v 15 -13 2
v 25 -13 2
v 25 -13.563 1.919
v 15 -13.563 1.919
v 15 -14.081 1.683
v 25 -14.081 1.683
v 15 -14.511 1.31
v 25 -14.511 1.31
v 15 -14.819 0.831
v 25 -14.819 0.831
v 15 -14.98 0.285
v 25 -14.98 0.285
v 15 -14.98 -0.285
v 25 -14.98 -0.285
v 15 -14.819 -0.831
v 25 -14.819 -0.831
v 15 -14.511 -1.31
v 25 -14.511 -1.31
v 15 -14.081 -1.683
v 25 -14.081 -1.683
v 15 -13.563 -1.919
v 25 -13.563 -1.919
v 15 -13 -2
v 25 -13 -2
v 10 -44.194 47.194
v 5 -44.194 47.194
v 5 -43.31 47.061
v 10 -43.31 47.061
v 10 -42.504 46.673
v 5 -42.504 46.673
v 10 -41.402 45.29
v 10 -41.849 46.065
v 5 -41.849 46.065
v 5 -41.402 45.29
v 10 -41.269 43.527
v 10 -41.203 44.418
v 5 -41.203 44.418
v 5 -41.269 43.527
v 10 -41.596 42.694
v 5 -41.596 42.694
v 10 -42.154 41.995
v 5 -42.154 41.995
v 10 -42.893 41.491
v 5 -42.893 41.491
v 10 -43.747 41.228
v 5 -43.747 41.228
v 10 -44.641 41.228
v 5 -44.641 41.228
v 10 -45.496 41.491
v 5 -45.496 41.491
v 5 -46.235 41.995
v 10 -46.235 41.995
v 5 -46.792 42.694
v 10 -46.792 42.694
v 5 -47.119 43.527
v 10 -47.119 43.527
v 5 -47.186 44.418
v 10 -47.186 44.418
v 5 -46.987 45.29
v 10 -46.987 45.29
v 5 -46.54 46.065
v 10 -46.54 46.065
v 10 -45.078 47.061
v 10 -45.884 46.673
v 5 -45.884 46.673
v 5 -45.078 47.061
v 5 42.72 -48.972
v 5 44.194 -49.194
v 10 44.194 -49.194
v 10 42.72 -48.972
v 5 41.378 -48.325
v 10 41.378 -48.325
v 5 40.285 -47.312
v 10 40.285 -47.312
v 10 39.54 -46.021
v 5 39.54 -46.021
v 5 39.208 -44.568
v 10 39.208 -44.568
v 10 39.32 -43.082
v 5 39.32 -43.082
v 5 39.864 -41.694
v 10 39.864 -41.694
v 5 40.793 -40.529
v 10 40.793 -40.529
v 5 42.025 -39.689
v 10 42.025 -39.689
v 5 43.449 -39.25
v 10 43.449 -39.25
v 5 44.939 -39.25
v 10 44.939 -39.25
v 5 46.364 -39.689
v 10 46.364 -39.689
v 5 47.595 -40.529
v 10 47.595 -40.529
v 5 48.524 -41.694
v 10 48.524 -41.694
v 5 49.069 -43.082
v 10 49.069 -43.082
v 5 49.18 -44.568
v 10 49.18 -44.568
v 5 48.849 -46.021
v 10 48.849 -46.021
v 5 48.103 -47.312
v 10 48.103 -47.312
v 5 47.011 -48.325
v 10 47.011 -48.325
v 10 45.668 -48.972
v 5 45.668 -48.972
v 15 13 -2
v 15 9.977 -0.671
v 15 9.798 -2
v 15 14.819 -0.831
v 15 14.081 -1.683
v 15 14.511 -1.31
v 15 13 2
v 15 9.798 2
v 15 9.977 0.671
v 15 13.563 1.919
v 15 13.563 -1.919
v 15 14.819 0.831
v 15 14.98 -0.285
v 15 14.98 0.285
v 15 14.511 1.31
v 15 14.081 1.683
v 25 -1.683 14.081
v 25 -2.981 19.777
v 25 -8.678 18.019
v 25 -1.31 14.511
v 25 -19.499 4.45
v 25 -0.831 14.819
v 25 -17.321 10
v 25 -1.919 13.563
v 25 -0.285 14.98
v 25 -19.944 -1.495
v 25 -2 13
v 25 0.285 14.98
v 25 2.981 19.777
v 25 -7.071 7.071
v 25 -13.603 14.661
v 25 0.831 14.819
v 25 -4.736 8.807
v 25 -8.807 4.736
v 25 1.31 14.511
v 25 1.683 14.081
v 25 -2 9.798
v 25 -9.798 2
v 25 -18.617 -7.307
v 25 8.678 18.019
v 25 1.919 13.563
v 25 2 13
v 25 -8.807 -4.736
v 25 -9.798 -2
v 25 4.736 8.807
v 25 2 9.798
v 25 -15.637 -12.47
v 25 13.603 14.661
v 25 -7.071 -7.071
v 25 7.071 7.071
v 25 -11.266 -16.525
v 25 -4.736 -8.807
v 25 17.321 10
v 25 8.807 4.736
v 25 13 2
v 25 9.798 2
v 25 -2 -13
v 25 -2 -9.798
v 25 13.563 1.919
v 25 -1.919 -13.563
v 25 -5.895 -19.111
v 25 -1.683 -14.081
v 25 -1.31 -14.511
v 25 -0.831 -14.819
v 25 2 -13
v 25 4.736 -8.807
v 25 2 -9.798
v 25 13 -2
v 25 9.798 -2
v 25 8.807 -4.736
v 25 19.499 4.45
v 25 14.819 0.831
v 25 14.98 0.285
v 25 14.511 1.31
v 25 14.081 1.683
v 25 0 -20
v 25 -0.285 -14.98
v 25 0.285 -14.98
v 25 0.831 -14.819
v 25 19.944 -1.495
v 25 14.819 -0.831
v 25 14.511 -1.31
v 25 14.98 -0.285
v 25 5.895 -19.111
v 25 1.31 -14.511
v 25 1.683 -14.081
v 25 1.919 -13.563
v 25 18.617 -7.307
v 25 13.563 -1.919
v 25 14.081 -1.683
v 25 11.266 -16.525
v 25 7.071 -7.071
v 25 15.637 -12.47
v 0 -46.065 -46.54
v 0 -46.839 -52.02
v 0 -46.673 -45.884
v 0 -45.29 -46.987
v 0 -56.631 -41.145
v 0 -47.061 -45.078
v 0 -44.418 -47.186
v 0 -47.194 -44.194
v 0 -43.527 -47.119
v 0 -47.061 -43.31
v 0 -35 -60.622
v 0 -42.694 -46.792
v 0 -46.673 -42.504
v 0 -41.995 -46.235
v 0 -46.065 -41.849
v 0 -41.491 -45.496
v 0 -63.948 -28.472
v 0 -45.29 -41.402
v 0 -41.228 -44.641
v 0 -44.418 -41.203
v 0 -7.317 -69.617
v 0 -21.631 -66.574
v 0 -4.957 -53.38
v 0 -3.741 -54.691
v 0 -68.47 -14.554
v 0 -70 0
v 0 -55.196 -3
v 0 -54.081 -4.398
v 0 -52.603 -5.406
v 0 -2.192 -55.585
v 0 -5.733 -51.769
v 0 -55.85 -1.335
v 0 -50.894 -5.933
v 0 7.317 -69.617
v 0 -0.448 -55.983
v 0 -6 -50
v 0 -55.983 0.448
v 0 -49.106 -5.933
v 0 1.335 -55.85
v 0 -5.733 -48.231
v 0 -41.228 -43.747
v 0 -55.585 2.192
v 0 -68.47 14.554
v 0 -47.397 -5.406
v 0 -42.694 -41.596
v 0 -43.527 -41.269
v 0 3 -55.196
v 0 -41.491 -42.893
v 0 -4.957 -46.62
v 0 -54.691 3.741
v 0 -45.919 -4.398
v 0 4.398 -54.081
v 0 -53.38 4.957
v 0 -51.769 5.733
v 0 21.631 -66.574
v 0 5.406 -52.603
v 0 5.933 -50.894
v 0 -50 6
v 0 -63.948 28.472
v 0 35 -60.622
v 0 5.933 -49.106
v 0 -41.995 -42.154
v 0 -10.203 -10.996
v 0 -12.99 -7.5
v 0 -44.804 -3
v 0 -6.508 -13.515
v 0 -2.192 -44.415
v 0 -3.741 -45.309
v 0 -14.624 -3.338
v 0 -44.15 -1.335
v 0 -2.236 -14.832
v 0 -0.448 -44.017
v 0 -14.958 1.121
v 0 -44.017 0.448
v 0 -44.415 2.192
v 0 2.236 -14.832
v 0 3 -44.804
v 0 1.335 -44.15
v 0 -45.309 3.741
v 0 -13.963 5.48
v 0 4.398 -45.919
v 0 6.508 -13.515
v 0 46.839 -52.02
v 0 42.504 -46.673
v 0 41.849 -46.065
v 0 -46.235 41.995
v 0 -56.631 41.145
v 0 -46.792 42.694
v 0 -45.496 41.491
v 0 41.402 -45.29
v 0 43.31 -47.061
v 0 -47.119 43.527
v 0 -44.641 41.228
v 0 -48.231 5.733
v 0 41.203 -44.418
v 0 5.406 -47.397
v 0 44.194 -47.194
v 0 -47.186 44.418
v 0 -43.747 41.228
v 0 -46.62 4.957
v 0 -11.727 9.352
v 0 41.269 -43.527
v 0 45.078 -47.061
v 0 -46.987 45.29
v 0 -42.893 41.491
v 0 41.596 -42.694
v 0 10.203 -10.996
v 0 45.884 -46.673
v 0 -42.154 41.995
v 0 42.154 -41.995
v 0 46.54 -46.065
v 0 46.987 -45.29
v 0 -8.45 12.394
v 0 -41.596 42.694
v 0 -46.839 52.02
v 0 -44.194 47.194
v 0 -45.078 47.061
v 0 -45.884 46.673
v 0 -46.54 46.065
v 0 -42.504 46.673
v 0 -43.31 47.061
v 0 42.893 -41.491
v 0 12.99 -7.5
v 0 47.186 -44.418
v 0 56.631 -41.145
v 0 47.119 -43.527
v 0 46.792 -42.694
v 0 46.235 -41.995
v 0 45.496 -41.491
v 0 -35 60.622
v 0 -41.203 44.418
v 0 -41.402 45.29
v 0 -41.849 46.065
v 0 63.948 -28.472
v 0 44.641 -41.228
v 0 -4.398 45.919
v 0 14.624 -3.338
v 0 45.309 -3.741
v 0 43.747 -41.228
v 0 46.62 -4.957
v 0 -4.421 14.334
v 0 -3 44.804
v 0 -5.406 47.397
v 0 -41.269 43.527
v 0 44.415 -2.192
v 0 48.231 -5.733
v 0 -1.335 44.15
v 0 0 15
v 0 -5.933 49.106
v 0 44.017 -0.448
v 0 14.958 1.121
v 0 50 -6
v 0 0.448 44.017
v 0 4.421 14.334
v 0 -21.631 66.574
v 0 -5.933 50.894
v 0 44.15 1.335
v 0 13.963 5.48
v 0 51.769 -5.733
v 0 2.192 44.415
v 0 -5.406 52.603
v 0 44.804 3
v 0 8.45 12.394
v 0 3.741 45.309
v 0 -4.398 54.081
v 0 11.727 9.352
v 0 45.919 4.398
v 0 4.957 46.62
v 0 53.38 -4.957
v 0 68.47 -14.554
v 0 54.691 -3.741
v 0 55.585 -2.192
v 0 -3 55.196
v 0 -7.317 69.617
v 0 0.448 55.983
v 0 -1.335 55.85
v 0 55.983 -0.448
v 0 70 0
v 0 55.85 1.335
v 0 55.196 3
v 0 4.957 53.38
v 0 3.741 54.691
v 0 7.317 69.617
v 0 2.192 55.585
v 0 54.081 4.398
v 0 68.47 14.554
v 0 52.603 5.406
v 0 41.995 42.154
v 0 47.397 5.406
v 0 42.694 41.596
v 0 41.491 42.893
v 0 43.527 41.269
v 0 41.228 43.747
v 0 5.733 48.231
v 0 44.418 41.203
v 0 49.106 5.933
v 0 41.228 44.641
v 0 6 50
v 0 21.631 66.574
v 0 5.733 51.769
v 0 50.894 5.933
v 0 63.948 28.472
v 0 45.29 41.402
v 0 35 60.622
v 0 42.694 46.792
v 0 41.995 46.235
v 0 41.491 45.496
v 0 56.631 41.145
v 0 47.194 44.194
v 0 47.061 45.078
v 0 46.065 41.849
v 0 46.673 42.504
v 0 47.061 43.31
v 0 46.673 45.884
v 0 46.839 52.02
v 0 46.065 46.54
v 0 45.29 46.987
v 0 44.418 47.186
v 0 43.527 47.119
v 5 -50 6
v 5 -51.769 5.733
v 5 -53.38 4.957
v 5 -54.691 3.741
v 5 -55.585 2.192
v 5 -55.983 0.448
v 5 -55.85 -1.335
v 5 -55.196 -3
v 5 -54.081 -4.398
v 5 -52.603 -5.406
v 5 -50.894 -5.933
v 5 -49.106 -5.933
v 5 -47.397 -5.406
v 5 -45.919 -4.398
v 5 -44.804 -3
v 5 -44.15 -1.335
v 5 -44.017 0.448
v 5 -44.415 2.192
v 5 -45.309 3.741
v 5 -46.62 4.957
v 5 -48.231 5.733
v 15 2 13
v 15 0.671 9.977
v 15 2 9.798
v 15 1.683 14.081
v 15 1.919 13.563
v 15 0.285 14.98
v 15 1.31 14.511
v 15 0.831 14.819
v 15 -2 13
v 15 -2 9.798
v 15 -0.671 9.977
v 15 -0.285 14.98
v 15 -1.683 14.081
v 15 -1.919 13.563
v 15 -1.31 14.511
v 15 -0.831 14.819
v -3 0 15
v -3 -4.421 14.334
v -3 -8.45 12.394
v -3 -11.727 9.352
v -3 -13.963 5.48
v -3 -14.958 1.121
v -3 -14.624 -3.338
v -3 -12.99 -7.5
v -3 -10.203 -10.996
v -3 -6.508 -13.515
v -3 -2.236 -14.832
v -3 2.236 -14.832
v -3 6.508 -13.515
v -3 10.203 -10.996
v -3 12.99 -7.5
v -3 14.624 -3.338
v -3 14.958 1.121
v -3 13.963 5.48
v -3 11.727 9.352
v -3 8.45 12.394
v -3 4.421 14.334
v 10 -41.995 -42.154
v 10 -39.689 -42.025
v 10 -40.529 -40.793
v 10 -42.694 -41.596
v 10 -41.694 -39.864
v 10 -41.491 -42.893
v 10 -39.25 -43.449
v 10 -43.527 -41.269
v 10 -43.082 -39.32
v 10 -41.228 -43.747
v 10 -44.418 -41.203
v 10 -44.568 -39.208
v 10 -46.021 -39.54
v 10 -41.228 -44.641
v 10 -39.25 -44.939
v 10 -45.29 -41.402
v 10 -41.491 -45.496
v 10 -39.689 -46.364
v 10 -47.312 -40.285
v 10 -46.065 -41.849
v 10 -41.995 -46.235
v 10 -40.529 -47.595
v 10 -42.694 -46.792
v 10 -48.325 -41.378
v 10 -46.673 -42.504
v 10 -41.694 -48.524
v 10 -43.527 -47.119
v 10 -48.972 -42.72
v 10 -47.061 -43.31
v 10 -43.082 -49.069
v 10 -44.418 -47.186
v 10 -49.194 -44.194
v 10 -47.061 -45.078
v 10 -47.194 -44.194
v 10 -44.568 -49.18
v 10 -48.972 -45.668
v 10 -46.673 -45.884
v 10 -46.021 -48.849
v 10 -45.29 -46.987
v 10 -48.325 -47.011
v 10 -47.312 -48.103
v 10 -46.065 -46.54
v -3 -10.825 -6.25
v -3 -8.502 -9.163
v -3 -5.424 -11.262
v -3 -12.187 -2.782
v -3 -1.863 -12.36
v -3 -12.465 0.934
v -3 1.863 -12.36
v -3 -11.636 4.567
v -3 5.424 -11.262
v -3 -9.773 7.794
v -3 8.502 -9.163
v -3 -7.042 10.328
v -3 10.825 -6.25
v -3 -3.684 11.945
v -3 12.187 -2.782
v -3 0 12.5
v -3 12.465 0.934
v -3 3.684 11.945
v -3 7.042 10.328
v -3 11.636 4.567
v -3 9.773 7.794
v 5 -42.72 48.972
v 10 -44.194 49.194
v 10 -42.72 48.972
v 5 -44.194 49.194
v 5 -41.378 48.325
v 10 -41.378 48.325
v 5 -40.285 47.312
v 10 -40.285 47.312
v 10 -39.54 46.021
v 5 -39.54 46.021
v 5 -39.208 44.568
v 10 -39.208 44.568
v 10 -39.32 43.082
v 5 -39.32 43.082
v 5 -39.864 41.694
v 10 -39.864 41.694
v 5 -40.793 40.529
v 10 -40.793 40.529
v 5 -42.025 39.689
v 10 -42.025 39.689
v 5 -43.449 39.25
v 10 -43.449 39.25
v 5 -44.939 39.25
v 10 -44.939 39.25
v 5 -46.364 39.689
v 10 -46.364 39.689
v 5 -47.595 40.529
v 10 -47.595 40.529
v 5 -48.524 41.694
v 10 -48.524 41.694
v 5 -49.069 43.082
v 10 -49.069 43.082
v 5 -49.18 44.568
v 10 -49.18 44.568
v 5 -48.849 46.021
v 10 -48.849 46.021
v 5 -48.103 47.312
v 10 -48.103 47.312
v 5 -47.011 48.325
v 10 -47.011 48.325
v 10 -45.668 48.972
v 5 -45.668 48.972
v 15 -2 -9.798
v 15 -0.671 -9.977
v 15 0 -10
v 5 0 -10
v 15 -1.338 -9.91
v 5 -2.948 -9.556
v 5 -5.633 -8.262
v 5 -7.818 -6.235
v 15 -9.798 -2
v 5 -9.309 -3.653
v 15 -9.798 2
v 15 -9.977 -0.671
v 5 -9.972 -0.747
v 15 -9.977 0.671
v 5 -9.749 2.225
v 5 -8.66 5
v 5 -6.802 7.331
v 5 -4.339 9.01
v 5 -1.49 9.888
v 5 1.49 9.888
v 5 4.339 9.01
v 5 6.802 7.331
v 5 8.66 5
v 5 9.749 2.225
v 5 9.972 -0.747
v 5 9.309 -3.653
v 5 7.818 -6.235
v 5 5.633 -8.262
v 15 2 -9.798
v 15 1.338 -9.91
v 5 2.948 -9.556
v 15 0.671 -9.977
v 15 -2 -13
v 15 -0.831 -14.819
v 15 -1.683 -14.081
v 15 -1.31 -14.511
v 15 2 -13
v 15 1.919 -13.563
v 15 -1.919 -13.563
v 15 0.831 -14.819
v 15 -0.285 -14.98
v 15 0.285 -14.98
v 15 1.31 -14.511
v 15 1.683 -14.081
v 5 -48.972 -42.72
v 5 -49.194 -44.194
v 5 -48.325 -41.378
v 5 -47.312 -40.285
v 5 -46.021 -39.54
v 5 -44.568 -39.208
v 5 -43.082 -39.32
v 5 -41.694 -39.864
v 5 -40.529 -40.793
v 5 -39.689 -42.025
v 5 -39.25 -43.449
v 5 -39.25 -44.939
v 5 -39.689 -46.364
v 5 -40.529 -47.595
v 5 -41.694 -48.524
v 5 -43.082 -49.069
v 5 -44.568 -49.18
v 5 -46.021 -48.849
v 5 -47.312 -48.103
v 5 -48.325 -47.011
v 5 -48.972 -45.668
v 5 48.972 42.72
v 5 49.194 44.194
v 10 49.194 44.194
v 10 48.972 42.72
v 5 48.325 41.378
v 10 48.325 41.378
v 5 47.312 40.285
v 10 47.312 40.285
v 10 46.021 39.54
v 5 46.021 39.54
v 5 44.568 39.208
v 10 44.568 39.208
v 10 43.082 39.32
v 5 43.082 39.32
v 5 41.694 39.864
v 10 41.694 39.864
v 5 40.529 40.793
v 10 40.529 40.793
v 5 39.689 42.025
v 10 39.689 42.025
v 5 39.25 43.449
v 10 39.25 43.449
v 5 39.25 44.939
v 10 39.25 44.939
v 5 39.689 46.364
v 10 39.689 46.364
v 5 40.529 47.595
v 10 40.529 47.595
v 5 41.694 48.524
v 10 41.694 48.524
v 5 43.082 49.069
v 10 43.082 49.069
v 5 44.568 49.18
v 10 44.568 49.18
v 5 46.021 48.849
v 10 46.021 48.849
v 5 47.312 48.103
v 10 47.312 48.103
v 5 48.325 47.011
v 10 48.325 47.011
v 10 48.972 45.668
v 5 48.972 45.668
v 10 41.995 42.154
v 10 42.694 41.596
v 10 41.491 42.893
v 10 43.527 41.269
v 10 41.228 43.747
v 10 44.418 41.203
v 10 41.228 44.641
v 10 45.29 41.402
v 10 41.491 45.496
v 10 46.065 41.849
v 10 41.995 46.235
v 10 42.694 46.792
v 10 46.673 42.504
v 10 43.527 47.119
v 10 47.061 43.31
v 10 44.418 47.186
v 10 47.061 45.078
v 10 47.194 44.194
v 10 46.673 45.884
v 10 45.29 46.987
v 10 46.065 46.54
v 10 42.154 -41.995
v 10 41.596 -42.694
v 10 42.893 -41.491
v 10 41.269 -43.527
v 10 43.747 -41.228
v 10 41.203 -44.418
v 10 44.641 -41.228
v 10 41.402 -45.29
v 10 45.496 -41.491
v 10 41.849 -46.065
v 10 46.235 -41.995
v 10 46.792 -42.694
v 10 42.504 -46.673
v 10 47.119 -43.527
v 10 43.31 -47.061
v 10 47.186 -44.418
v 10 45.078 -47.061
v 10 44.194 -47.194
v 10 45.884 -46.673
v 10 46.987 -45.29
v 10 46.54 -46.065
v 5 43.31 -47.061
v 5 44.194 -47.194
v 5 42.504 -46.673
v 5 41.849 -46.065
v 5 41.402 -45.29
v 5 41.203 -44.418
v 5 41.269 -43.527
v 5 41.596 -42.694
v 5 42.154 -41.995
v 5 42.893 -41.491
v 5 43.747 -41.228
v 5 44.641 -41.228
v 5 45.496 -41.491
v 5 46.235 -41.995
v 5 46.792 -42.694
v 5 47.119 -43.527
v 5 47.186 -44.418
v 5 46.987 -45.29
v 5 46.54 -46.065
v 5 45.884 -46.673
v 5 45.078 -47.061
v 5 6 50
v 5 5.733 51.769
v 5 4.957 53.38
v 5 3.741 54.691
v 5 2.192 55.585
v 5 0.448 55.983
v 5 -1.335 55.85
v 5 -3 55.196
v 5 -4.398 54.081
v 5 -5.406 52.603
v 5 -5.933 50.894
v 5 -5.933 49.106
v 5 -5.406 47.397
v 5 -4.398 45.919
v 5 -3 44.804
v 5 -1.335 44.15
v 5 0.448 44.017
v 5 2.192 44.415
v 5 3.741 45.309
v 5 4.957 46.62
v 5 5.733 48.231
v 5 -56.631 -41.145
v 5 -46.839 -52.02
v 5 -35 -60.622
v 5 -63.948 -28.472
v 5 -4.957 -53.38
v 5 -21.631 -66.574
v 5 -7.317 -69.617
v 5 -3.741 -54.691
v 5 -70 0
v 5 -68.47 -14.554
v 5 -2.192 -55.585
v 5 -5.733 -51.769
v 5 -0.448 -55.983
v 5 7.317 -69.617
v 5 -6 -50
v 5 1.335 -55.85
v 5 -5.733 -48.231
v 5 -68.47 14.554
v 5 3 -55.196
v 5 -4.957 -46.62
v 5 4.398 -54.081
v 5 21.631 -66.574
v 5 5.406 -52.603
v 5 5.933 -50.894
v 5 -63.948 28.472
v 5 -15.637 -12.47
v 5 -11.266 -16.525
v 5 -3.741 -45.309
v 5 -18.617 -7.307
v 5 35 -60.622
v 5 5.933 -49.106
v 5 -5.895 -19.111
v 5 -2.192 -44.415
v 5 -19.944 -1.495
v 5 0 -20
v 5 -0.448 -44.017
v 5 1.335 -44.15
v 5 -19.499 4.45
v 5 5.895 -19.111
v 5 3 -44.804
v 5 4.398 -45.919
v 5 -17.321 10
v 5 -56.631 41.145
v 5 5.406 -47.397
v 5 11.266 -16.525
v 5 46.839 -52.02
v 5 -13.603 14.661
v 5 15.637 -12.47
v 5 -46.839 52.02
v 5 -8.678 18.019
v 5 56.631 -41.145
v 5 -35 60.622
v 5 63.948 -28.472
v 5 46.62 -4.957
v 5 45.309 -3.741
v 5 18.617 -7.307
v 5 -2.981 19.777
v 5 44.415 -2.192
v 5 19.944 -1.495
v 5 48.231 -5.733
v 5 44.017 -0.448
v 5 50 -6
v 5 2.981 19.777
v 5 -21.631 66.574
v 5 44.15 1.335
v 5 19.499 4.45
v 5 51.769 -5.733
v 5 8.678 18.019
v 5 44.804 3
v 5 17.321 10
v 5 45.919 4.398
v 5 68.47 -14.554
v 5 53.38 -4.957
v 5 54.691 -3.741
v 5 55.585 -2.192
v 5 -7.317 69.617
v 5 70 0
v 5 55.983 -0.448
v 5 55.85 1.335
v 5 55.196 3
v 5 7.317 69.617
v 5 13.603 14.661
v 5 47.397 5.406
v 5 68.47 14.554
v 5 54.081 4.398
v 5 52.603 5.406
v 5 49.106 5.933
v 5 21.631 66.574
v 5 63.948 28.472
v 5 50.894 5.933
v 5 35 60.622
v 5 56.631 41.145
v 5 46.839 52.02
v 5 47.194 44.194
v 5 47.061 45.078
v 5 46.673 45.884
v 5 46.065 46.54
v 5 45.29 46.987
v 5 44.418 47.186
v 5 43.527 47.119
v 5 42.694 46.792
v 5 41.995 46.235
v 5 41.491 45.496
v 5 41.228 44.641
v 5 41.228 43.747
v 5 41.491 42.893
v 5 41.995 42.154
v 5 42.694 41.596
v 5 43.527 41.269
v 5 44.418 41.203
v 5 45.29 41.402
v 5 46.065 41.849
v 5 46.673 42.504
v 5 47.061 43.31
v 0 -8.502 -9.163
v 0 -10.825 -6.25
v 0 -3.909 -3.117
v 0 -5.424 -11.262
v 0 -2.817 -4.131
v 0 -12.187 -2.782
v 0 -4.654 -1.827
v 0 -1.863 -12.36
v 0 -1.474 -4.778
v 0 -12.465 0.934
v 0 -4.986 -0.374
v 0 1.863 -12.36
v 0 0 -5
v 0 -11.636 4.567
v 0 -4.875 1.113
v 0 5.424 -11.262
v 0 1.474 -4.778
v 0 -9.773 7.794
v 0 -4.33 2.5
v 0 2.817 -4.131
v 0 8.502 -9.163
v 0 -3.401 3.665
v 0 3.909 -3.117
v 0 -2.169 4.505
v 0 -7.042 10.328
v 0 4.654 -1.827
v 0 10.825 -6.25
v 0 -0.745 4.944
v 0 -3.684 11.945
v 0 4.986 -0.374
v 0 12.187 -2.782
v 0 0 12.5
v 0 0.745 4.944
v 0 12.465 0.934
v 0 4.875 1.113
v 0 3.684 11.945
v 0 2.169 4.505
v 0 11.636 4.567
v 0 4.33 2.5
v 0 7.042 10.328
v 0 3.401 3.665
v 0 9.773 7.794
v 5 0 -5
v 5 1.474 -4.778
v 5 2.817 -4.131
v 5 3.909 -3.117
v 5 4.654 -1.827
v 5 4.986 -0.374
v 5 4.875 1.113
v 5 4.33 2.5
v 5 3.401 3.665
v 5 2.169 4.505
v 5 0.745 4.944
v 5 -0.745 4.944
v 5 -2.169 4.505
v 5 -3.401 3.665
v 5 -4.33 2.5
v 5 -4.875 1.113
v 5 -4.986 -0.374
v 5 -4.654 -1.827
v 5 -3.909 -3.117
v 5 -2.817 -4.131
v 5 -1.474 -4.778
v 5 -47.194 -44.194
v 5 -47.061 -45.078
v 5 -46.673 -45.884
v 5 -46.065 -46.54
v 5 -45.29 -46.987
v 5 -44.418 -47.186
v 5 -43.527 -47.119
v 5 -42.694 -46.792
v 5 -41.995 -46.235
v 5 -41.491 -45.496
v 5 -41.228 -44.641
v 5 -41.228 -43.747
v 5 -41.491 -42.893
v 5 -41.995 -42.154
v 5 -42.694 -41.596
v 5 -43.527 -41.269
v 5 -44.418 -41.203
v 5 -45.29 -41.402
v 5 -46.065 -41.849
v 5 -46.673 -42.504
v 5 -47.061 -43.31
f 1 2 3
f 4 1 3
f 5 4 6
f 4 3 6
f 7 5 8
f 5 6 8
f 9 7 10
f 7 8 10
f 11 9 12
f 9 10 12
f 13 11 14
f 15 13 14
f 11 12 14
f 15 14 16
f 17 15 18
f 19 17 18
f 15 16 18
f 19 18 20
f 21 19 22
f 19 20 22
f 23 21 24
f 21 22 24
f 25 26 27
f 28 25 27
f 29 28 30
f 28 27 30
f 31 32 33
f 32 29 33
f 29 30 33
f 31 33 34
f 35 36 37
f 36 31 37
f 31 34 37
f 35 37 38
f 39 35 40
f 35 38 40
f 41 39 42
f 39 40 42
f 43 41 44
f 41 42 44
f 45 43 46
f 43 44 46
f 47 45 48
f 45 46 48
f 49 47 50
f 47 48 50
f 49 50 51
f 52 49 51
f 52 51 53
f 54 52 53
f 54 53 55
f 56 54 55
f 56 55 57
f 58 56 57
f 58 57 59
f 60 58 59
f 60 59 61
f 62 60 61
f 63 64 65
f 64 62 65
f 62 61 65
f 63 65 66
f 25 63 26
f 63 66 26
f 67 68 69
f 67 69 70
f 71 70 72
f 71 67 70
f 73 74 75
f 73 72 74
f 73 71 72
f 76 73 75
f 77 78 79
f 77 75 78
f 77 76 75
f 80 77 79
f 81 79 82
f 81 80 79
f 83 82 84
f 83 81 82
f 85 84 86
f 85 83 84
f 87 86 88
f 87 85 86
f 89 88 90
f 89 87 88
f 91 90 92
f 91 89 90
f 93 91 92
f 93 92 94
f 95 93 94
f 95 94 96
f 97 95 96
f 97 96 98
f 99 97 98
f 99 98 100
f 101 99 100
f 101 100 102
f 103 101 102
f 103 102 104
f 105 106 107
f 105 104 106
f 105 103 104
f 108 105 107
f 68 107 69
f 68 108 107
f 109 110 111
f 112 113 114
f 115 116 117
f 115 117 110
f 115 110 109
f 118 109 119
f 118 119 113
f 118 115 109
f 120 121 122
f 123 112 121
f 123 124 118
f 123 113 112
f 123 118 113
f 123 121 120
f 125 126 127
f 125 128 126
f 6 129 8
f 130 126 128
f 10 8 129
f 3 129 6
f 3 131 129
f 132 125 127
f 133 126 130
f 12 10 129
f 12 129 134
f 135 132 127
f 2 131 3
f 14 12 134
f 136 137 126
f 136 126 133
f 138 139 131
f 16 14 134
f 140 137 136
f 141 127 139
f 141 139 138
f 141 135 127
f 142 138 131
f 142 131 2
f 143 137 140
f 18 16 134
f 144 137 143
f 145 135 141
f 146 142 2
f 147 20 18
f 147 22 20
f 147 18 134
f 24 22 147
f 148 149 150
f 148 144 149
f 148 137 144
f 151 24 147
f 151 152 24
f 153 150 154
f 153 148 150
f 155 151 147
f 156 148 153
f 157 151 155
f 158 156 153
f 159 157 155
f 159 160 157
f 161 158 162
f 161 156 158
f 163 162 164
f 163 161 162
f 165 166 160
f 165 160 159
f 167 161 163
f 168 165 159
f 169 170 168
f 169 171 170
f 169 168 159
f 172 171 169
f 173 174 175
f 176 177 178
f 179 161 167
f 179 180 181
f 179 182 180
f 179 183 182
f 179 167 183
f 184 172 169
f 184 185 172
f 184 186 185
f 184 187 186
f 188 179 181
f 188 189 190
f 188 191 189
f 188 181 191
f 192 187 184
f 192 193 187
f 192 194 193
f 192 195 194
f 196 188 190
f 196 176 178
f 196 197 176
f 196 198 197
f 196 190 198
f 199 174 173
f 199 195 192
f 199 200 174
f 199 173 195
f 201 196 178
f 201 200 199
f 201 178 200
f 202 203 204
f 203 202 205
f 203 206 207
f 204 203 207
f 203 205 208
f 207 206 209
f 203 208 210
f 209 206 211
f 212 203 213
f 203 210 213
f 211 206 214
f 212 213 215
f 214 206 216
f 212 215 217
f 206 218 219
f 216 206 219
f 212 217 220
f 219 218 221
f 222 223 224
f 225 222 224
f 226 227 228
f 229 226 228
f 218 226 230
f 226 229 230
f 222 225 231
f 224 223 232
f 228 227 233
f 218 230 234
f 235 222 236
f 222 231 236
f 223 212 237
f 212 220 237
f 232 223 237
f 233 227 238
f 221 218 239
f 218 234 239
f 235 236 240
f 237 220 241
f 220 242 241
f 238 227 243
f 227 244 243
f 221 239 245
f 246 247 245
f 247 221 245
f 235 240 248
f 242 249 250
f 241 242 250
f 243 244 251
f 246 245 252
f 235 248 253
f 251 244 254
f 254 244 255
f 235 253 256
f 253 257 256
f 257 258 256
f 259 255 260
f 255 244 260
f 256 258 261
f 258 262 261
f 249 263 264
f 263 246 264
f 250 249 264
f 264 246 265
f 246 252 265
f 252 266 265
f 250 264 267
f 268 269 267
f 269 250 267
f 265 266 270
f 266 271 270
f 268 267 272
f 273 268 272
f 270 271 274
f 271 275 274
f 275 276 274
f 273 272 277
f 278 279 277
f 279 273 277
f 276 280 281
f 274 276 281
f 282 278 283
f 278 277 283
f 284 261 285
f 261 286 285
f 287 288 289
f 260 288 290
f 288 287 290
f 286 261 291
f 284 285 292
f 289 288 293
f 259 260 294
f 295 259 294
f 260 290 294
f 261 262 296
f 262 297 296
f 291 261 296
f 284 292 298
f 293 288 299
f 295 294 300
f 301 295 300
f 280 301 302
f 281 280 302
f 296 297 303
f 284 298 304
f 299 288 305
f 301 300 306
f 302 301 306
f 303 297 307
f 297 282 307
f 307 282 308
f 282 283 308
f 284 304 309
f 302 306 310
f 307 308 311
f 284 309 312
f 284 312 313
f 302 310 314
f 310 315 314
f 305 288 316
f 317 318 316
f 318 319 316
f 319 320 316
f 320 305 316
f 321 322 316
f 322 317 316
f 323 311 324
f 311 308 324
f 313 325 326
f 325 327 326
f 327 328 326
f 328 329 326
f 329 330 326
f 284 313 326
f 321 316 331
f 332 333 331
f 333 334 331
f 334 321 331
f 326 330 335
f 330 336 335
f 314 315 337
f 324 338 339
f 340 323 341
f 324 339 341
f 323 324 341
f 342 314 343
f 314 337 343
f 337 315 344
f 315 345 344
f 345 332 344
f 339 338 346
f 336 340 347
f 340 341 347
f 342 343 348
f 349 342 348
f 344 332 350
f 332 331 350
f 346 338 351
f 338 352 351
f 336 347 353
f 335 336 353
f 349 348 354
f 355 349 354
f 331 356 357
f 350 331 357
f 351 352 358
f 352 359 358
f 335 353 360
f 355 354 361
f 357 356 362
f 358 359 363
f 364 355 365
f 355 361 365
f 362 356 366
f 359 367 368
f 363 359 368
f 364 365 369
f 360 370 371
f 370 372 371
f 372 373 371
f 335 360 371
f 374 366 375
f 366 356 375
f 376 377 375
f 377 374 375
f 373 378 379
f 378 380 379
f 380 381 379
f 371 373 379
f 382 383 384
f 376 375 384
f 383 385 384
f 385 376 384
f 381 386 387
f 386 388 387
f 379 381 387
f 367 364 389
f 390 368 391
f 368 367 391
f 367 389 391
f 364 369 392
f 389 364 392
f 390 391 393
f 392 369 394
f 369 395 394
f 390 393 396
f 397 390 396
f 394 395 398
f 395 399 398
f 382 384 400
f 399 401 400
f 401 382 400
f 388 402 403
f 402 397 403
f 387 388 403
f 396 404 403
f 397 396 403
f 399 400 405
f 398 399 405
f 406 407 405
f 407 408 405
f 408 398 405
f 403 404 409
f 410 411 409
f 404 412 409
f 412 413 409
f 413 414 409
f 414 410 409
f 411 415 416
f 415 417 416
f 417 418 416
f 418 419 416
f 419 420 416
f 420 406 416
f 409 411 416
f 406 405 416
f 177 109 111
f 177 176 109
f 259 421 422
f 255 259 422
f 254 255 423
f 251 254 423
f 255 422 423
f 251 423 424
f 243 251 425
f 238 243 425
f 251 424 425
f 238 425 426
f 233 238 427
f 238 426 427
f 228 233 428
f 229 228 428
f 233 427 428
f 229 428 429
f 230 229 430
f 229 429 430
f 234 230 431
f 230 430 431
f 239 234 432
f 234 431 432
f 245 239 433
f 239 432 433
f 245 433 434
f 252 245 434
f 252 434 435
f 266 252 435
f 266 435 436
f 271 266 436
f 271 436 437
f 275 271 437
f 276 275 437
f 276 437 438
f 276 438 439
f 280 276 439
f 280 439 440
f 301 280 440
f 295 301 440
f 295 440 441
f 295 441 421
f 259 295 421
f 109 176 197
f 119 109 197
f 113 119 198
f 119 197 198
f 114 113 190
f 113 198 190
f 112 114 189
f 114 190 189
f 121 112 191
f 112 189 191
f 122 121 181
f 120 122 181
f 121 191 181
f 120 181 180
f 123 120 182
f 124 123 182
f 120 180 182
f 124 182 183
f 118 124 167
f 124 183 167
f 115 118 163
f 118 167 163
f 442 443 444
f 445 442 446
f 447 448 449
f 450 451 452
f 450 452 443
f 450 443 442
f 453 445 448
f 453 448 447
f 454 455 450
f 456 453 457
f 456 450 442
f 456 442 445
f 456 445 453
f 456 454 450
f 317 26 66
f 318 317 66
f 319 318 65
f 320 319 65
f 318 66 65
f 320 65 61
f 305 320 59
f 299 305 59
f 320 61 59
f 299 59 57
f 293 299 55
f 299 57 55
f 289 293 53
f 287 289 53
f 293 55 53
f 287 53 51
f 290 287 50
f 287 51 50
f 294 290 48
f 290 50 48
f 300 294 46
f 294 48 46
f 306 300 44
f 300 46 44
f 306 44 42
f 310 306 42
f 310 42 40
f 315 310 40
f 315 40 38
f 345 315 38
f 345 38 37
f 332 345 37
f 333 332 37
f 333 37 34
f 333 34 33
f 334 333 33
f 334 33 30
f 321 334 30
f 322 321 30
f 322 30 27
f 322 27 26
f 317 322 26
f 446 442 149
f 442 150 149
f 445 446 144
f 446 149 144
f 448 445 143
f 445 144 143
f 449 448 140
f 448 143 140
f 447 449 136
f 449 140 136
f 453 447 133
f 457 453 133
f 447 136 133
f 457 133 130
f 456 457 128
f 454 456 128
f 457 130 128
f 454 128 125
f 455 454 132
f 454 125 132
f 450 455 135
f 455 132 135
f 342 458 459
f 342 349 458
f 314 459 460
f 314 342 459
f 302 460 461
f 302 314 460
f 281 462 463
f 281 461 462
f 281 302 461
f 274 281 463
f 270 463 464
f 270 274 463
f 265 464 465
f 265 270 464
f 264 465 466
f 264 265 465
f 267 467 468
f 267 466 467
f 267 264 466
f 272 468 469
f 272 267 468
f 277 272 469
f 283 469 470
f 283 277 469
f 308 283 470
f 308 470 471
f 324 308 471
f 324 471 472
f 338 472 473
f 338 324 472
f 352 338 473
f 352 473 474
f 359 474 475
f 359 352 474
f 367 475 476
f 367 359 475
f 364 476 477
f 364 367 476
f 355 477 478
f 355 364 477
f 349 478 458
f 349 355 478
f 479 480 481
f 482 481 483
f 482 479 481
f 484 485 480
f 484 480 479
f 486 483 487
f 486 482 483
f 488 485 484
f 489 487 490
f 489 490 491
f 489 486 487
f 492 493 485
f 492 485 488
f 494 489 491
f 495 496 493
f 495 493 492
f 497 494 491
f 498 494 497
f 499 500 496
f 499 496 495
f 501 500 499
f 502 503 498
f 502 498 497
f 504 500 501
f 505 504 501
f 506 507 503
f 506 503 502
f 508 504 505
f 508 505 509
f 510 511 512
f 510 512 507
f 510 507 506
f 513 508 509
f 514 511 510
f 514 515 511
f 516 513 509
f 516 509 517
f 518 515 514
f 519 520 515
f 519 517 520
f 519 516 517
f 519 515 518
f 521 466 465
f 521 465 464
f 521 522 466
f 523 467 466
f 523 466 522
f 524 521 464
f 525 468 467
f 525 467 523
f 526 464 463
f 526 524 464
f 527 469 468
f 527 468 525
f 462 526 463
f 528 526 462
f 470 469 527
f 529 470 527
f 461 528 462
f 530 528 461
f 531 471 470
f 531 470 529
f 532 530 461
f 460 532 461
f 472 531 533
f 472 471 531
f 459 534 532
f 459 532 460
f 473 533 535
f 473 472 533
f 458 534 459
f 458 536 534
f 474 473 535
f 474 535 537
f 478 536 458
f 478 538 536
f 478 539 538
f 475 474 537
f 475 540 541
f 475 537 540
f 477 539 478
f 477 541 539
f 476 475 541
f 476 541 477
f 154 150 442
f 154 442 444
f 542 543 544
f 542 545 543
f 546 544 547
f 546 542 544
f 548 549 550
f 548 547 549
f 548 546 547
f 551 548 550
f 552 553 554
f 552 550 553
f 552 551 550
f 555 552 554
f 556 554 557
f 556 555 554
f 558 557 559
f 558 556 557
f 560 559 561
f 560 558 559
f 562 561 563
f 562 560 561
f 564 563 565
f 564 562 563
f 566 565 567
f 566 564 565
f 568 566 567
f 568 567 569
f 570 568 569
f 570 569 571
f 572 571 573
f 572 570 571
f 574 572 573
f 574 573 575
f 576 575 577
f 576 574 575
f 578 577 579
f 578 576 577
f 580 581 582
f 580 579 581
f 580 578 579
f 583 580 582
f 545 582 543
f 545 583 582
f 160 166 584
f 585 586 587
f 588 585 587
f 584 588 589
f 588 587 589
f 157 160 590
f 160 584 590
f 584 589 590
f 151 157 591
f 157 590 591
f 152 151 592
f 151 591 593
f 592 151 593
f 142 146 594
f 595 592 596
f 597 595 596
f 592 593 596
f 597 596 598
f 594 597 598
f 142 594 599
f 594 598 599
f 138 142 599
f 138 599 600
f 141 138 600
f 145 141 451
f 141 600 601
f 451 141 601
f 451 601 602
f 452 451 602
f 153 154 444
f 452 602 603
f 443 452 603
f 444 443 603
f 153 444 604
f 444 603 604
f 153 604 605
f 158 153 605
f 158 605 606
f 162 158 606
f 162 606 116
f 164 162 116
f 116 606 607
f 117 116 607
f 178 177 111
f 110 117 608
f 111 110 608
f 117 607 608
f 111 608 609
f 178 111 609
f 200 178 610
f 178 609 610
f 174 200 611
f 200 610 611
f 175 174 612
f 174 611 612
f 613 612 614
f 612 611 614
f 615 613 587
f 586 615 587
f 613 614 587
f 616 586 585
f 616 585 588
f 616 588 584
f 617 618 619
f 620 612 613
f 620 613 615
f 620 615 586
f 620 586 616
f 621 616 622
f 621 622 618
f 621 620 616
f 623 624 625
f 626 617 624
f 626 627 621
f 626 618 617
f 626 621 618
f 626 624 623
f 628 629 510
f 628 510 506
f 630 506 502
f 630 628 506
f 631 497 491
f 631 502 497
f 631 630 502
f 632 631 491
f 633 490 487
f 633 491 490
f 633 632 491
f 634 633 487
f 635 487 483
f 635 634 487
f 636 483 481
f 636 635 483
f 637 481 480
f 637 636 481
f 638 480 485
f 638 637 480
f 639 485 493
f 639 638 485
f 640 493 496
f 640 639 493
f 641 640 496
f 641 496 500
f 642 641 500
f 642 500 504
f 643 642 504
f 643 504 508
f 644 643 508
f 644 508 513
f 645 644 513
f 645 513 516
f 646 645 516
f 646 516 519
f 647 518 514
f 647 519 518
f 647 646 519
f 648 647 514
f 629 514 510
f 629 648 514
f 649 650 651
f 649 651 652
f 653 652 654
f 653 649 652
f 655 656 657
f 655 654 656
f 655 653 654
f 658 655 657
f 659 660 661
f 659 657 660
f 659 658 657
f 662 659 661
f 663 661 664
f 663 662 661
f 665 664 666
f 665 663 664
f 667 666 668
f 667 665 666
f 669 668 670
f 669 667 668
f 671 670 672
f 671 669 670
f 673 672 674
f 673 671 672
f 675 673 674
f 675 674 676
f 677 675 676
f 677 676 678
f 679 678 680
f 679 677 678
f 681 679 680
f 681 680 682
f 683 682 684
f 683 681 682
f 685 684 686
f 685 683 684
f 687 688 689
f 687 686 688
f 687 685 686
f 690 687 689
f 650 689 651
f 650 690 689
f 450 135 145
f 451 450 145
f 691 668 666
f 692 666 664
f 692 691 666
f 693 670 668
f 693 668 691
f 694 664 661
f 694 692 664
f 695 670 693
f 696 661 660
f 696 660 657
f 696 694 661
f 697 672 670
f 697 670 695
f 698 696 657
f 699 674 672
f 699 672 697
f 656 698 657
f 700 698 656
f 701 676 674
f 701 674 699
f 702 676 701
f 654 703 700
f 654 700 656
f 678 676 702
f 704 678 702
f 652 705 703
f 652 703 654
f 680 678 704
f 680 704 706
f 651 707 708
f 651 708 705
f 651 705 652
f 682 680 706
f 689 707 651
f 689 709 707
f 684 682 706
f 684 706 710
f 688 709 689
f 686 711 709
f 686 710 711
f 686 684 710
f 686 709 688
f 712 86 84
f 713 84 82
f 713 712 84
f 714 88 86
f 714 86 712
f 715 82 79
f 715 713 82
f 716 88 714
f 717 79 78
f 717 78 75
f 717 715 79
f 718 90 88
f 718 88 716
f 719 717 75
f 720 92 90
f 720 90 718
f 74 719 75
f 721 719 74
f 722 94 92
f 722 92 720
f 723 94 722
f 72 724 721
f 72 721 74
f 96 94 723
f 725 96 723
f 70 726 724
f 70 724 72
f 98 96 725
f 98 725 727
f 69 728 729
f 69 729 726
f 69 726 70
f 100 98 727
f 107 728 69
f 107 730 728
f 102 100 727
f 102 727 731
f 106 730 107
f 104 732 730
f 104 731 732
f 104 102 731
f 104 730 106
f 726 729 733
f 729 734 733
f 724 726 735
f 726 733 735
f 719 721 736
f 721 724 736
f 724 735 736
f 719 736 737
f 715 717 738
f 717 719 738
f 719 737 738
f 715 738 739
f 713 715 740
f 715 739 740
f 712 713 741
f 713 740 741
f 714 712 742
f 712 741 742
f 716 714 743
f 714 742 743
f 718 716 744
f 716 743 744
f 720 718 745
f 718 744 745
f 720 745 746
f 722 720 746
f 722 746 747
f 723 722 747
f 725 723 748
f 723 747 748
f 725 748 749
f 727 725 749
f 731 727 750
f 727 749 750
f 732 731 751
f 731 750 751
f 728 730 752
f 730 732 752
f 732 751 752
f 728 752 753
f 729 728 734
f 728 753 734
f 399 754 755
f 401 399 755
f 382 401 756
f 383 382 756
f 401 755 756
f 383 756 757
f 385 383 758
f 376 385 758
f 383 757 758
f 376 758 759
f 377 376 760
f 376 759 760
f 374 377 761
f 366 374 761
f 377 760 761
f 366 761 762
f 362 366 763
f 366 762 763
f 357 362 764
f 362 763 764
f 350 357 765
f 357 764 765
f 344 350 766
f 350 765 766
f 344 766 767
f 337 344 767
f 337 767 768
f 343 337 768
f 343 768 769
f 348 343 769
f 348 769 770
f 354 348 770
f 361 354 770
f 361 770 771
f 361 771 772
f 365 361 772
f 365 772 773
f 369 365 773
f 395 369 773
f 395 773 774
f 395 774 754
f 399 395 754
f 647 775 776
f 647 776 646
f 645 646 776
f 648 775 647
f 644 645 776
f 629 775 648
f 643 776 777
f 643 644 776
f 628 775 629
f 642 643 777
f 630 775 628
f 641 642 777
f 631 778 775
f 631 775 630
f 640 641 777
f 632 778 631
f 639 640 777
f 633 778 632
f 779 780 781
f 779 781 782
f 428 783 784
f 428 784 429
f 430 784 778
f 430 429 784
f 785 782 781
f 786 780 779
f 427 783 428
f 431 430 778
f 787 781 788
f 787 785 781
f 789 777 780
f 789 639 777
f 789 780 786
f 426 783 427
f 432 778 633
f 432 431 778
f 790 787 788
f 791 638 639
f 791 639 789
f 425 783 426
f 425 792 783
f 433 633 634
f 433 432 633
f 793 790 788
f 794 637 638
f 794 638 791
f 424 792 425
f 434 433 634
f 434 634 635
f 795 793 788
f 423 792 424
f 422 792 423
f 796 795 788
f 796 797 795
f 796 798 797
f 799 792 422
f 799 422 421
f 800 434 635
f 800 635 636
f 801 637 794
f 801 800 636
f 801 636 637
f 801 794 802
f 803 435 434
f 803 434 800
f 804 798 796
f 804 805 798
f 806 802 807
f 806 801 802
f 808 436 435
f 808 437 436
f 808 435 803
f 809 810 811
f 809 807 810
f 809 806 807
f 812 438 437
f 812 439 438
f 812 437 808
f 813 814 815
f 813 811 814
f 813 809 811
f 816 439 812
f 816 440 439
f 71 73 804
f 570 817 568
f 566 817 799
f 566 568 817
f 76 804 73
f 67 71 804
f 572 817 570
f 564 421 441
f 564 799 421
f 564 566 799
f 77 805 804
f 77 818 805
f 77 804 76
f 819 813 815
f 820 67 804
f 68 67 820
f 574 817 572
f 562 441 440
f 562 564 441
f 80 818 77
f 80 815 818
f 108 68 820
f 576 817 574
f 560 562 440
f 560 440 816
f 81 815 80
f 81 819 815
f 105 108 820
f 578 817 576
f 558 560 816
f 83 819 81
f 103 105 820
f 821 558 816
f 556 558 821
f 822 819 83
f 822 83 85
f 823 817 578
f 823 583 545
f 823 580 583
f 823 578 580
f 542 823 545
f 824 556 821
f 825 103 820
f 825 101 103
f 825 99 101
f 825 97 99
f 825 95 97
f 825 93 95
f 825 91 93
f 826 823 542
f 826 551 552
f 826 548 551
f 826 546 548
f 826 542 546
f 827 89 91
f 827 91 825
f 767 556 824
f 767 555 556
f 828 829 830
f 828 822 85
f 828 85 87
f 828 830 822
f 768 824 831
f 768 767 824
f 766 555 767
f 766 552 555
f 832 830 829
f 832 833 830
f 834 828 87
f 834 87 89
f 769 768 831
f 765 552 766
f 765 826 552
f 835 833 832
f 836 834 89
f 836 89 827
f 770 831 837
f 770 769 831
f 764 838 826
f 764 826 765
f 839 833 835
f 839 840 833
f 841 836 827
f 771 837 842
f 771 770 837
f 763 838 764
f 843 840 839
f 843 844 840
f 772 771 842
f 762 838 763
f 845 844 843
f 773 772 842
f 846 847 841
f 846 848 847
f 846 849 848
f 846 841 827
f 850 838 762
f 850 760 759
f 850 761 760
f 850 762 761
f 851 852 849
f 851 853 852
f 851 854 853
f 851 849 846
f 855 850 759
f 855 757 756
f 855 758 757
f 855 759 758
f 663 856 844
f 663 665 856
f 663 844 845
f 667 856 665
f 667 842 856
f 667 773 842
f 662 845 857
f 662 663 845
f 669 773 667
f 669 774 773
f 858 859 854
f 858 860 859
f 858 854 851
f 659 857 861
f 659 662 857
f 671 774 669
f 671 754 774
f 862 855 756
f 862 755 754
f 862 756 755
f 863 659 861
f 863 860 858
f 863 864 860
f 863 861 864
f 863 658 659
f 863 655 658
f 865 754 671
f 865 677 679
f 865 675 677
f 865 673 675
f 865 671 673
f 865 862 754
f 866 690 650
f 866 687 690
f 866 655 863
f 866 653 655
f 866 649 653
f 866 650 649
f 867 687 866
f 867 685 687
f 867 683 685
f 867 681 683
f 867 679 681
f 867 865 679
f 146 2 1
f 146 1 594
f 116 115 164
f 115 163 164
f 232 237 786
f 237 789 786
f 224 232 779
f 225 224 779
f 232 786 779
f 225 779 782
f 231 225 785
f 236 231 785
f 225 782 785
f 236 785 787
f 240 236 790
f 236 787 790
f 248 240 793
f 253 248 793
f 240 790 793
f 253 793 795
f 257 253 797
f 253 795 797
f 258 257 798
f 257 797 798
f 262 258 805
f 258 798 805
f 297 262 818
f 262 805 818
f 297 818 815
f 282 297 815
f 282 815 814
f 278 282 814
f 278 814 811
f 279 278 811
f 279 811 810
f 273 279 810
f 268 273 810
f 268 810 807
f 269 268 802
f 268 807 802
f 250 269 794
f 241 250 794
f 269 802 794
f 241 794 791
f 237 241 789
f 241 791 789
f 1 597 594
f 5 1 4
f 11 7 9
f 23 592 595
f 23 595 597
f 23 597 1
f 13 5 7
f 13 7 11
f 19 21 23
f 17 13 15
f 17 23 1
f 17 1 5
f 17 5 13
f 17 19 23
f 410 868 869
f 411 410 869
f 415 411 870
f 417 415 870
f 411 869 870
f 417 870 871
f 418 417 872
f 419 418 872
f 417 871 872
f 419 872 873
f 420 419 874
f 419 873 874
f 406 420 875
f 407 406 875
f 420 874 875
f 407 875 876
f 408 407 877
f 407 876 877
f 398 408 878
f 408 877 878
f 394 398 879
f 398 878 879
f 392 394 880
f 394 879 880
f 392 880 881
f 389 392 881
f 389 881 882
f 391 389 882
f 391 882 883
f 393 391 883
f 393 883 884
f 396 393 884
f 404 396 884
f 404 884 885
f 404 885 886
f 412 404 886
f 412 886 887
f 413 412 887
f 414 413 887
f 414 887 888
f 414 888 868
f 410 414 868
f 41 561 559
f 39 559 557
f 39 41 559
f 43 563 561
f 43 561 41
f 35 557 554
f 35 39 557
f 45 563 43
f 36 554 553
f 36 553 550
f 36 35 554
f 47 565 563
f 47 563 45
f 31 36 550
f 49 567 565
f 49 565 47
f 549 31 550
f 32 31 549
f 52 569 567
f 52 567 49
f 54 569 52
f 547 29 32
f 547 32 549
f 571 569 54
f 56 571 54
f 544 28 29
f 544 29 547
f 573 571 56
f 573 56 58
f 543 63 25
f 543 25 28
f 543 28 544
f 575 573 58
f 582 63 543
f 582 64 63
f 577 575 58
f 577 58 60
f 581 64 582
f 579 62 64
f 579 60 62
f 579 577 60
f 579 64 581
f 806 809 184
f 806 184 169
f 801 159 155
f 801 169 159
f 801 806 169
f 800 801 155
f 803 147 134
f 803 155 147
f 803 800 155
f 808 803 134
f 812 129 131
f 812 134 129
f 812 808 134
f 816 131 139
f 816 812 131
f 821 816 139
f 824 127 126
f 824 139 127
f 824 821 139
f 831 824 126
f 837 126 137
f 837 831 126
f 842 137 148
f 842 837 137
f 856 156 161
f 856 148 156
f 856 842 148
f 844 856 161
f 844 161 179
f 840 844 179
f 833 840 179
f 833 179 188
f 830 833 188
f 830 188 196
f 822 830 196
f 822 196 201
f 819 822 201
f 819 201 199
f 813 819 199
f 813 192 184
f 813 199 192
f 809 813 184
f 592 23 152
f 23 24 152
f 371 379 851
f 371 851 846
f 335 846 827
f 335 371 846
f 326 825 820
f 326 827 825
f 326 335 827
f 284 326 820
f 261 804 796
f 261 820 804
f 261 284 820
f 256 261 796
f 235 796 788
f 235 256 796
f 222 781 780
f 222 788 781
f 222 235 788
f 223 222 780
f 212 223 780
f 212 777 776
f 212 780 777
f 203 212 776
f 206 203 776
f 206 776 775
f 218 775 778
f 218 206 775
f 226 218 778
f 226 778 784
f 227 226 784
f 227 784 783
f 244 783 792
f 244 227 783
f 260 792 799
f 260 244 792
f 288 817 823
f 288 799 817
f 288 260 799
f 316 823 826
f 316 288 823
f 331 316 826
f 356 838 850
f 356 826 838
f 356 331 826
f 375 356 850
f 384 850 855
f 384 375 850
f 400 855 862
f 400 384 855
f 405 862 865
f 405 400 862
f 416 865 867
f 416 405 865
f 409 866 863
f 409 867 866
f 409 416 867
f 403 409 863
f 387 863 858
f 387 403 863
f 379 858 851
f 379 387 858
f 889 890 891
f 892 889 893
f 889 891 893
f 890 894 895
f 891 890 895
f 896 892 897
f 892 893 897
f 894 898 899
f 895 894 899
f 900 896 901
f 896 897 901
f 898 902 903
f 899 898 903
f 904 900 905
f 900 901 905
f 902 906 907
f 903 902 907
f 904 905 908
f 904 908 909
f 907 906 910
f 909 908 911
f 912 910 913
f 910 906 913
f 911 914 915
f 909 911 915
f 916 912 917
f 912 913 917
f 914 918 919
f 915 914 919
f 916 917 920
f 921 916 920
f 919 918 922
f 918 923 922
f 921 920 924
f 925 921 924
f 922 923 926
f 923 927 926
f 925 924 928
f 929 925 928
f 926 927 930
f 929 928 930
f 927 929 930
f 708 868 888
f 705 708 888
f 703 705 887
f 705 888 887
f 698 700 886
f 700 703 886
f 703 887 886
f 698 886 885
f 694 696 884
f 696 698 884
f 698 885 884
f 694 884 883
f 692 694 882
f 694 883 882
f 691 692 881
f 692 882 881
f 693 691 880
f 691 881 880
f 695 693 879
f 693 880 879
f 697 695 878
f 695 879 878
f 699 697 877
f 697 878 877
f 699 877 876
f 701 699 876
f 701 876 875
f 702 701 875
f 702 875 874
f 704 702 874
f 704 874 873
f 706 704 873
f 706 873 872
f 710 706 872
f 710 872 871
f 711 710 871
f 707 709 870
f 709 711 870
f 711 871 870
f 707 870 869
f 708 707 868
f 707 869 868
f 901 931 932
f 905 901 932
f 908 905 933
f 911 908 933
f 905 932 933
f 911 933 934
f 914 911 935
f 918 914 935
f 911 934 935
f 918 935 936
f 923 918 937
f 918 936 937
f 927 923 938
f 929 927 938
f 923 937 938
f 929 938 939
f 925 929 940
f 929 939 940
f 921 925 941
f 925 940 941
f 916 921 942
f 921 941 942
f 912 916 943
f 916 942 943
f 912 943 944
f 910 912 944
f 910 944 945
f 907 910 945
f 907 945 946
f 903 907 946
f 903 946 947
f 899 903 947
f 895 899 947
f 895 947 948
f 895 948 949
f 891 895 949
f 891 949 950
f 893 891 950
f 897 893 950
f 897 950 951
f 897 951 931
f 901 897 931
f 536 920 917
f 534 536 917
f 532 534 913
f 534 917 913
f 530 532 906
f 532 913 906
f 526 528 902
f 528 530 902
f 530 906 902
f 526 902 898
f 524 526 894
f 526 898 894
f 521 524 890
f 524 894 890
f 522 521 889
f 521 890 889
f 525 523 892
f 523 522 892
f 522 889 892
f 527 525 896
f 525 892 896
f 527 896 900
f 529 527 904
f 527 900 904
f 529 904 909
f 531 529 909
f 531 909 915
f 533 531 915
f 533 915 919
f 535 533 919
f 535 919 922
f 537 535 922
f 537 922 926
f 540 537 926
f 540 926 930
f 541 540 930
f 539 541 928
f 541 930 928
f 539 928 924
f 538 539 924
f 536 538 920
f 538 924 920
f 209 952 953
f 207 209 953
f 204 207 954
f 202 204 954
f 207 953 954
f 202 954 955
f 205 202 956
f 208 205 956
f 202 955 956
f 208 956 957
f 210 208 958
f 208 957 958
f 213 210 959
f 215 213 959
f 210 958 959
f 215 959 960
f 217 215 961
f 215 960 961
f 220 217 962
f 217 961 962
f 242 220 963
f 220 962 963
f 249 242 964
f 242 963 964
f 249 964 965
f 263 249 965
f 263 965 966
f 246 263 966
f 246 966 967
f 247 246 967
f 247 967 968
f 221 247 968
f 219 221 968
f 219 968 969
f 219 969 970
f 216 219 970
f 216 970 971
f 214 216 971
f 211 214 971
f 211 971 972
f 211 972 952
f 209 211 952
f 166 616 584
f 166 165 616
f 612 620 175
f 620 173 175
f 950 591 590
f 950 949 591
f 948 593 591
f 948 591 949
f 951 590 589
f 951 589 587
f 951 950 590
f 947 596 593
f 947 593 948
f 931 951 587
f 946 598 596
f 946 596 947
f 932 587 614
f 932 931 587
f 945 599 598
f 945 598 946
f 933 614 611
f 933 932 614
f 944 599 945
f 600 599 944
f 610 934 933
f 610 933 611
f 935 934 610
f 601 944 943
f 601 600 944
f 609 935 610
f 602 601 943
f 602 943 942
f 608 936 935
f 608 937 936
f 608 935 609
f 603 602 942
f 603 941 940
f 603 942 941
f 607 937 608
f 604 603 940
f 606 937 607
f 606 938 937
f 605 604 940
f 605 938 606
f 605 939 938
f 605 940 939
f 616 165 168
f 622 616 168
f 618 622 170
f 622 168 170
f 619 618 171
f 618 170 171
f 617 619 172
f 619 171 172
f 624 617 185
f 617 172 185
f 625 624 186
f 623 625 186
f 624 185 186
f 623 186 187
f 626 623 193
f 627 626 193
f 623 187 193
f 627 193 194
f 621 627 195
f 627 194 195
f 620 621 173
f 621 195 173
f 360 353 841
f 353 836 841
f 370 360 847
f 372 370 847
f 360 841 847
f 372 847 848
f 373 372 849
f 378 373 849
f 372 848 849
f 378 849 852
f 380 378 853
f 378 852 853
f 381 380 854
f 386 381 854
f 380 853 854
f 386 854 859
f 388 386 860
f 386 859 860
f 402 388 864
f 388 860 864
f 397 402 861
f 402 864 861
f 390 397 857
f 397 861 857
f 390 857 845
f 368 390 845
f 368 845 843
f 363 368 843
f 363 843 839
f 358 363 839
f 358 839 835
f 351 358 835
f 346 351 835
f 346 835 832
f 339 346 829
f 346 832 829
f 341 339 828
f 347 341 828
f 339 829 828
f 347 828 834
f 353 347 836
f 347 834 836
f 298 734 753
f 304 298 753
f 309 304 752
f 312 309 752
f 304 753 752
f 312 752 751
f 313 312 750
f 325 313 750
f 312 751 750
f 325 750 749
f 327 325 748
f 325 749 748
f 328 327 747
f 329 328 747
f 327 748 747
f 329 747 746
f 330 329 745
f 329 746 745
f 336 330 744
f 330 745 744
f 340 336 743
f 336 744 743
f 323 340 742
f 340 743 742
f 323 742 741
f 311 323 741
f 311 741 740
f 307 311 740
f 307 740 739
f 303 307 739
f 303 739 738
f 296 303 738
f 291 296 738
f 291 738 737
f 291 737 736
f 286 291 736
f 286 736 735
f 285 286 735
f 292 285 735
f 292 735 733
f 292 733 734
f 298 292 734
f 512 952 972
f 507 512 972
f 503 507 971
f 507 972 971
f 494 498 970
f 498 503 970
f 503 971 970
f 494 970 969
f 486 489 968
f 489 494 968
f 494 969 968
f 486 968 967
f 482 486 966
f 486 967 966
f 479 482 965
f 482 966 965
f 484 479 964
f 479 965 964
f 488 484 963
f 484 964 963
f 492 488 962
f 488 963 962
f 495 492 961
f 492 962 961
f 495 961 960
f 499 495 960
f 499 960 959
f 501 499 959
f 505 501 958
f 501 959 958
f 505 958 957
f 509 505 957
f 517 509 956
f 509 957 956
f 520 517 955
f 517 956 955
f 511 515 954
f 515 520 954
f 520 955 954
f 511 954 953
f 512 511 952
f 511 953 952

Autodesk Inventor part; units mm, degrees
ref_plane "YZ Plane" through (0, 0, 0) normal (1, 0, 0) x (0, 1, 0)
ref_plane "XY Plane" through (0, 0, 0) normal (0, 0, 1) x (1, 0, 0)
sketch "Sketch1" plane through (0, 0, 0) normal (1, 0, 0) x (0, 1, 0)
  circle A0 centre (0, 0) radius 70
  dimension "d2" = 140
extrude "Hub Face" add sketch "Sketch1" along normal blind 5
sketch "Sketch2" plane through (5, 0, 0) normal (1, 0, 0) x (0, 0, -1)
  circle A0 centre (0, 0) radius 50 construction
  circle A1 centre (0, 50) radius 6
  line L0 (0, 50) -> (0, 0) construction
  dimension "d4" = 100
  dimension "d3" = 12
extrude "Lug Bolt Hole" cut sketch "Sketch2" against normal up to surface (5 mm away)
pattern_circular "Lug Bolt Hole Pattern" count 4 over 360 about axis through (-10, 0, 0) along (1, 0, 0) of "Lug Bolt Hole"
sketch "Sketch3" plane through (5, 0, 0) normal (1, 0, 0) x (0, 0, -1)
  circle A0 centre (0, 0) radius 20
  circle A1 centre (0, 0) radius 10
  line L0 (-98, 0) -> (98, 0) construction
  line L1 (0, -98) -> (0, 98) construction
  arc A2 (13, -2) -> (13, 2) centre (13, 0) ccw
  arc A3 (7, 2) -> (7, -2) centre (7, 0) ccw
  line L2 (13, 2) -> (7, 2)
  line L3 (13, -2) -> (7, -2)
  point P0 (10, 0)
  point P1 (9.798, -2)
  point P2 (9.798, 2)
  dimension "d19" = 20
  dimension "d10" = 40
  dimension "d59" = 6
  dimension "d60" = 2
  dimension "d61" = 7
  dimension "d62" = 3
  dimension "d63" = 3
extrude "Hub Shaft" add sketch "Sketch3" along normal blind 20 contours A0 | A1 L2 A2 L3
ref_plane "Lock Pin Hole Plane" through (0, 15.875, 0) normal (0, 1, 0) x (-1, 0, 0)
sketch "Sketch10" plane through (25, 0, 0) normal (1, 0, 0) x (0, 0, -1)
  line L0 (-98, 0) -> (98, 0) construction
  arc A0 (7, 2) -> (7, -2) centre (7, 0) ccw projected
  line L1 (13, 2) -> (7, 2) projected
  line L2 (13, -2) -> (7, -2) projected
  arc A1 (13, -2) -> (13, 2) centre (13, 0) ccw projected
  point P0 (0, 0)
  dimension "d75" = 6
  dimension "d76" = 2
extrude "Key Slot" cut sketch "Sketch10" against normal blind 10
pattern_circular "Key Slot Pattern" count 4 over 360 about axis through (-10, 0, 0) along (1, 0, 0) of "Key Slot"
sketch "Sketch12" plane through (5, 0, 0) normal (1, 0, 0) x (0, 0, -1)
  arc A0 (-2, 9.798) -> (-9.798, 2) centre (0, 0) ccw construction
  arc A1 (-9.798, -2) -> (-2, -9.798) centre (0, 0) ccw construction
  arc A2 (2, -9.798) -> (9.798, -2) centre (0, 0) ccw construction
  arc A3 (9.798, 2) -> (2, 9.798) centre (0, 0) ccw construction
  circle A4 centre (0, 0) radius 10 construction
  circle A5 centre (0, 0) radius 10
  circle A6 centre (0, 0) radius 5
  dimension "d74" = 10
extrude "Extrusion10" cut sketch "Sketch12" against normal through all contours A6
sketch "Sketch13" plane through (0, 0, 0) normal (-1, 0, 0) x (0, 0, 1)
  circle A0 centre (0, 0) radius 15
  circle A1 centre (0, 0) radius 12.5
  dimension "d77" = 30
  dimension "d78" = 25
extrude "Extrusion11" add sketch "Sketch13" along normal blind 3
sketch "Sketch14" plane through (5, 0, 0) normal (1, 0, 0) x (0, 0, -1)
  circle A0 centre (0, 0) radius 62.5 construction
  circle A1 centre (44.1942, 44.1942) radius 5
  line L0 (-98, 0) -> (98, 0) construction
  line L1 (0, -98) -> (0, 98) construction
  line L2 (0, 0) -> (44.1942, 44.1942) construction
  circle A2 centre (44.1942, 44.1942) radius 3
  dimension "d81" = 125
  dimension "d82" = 45
  dimension "d83" = 10
  dimension "d84" = 6
extrude "Extrusion12" add sketch "Sketch14" along normal blind 5
extrude "Extrusion13" cut sketch "Sketch14" against normal through all contours A2
pattern_circular "Circular Pattern6" count 4 over 360 about axis through (-10, 0, 0) along (1, 0, 0) of "Extrusion12", "Extrusion13"
equation "\"d2\" = Hub_Diameter"
equation "\"d0\" = Hub_Thickness"
equation "\"d4\" = Lug_Bolt_Pattern_Diameter"
equation "\"d3\" = Lug_Bolt_Hole_Diameter"
equation "\"d17\" = Hub_Shaft_Length"
equation "\"Hub_Thickness\" = 5"
equation "\"Hub_Diameter\" = 140"
equation "\"Lug_Bolt_Hole_Diameter\" = 12"
equation "\"Hub_Shaft_Diameter\" = 1"
equation "\"Hub_Shaft_Wall_Thickness\" = 1"
equation "\"Hub_Shaft_Length\" = 20"
equation "\"Hub_Shaft_Outer_Diameter\" = 31.75"
equation "\"d20\" = 0.5 * Hub_Shaft_Outer_Diameter"
equation "\"Lock_Pin_Edge_Distance\" = 15"
equation "\"Wheel_Center_Hub_Diameter_Wall_Thickness\" = 5"
equation "\"Wheel_Center_Hub_Length\" = 5"
equation "\"Weight_Reduction_Hole_Angle\" = 45deg"
equation "\"Lug_Bolt_Pattern_Diameter\" = 100"
properties part number "Hub"
